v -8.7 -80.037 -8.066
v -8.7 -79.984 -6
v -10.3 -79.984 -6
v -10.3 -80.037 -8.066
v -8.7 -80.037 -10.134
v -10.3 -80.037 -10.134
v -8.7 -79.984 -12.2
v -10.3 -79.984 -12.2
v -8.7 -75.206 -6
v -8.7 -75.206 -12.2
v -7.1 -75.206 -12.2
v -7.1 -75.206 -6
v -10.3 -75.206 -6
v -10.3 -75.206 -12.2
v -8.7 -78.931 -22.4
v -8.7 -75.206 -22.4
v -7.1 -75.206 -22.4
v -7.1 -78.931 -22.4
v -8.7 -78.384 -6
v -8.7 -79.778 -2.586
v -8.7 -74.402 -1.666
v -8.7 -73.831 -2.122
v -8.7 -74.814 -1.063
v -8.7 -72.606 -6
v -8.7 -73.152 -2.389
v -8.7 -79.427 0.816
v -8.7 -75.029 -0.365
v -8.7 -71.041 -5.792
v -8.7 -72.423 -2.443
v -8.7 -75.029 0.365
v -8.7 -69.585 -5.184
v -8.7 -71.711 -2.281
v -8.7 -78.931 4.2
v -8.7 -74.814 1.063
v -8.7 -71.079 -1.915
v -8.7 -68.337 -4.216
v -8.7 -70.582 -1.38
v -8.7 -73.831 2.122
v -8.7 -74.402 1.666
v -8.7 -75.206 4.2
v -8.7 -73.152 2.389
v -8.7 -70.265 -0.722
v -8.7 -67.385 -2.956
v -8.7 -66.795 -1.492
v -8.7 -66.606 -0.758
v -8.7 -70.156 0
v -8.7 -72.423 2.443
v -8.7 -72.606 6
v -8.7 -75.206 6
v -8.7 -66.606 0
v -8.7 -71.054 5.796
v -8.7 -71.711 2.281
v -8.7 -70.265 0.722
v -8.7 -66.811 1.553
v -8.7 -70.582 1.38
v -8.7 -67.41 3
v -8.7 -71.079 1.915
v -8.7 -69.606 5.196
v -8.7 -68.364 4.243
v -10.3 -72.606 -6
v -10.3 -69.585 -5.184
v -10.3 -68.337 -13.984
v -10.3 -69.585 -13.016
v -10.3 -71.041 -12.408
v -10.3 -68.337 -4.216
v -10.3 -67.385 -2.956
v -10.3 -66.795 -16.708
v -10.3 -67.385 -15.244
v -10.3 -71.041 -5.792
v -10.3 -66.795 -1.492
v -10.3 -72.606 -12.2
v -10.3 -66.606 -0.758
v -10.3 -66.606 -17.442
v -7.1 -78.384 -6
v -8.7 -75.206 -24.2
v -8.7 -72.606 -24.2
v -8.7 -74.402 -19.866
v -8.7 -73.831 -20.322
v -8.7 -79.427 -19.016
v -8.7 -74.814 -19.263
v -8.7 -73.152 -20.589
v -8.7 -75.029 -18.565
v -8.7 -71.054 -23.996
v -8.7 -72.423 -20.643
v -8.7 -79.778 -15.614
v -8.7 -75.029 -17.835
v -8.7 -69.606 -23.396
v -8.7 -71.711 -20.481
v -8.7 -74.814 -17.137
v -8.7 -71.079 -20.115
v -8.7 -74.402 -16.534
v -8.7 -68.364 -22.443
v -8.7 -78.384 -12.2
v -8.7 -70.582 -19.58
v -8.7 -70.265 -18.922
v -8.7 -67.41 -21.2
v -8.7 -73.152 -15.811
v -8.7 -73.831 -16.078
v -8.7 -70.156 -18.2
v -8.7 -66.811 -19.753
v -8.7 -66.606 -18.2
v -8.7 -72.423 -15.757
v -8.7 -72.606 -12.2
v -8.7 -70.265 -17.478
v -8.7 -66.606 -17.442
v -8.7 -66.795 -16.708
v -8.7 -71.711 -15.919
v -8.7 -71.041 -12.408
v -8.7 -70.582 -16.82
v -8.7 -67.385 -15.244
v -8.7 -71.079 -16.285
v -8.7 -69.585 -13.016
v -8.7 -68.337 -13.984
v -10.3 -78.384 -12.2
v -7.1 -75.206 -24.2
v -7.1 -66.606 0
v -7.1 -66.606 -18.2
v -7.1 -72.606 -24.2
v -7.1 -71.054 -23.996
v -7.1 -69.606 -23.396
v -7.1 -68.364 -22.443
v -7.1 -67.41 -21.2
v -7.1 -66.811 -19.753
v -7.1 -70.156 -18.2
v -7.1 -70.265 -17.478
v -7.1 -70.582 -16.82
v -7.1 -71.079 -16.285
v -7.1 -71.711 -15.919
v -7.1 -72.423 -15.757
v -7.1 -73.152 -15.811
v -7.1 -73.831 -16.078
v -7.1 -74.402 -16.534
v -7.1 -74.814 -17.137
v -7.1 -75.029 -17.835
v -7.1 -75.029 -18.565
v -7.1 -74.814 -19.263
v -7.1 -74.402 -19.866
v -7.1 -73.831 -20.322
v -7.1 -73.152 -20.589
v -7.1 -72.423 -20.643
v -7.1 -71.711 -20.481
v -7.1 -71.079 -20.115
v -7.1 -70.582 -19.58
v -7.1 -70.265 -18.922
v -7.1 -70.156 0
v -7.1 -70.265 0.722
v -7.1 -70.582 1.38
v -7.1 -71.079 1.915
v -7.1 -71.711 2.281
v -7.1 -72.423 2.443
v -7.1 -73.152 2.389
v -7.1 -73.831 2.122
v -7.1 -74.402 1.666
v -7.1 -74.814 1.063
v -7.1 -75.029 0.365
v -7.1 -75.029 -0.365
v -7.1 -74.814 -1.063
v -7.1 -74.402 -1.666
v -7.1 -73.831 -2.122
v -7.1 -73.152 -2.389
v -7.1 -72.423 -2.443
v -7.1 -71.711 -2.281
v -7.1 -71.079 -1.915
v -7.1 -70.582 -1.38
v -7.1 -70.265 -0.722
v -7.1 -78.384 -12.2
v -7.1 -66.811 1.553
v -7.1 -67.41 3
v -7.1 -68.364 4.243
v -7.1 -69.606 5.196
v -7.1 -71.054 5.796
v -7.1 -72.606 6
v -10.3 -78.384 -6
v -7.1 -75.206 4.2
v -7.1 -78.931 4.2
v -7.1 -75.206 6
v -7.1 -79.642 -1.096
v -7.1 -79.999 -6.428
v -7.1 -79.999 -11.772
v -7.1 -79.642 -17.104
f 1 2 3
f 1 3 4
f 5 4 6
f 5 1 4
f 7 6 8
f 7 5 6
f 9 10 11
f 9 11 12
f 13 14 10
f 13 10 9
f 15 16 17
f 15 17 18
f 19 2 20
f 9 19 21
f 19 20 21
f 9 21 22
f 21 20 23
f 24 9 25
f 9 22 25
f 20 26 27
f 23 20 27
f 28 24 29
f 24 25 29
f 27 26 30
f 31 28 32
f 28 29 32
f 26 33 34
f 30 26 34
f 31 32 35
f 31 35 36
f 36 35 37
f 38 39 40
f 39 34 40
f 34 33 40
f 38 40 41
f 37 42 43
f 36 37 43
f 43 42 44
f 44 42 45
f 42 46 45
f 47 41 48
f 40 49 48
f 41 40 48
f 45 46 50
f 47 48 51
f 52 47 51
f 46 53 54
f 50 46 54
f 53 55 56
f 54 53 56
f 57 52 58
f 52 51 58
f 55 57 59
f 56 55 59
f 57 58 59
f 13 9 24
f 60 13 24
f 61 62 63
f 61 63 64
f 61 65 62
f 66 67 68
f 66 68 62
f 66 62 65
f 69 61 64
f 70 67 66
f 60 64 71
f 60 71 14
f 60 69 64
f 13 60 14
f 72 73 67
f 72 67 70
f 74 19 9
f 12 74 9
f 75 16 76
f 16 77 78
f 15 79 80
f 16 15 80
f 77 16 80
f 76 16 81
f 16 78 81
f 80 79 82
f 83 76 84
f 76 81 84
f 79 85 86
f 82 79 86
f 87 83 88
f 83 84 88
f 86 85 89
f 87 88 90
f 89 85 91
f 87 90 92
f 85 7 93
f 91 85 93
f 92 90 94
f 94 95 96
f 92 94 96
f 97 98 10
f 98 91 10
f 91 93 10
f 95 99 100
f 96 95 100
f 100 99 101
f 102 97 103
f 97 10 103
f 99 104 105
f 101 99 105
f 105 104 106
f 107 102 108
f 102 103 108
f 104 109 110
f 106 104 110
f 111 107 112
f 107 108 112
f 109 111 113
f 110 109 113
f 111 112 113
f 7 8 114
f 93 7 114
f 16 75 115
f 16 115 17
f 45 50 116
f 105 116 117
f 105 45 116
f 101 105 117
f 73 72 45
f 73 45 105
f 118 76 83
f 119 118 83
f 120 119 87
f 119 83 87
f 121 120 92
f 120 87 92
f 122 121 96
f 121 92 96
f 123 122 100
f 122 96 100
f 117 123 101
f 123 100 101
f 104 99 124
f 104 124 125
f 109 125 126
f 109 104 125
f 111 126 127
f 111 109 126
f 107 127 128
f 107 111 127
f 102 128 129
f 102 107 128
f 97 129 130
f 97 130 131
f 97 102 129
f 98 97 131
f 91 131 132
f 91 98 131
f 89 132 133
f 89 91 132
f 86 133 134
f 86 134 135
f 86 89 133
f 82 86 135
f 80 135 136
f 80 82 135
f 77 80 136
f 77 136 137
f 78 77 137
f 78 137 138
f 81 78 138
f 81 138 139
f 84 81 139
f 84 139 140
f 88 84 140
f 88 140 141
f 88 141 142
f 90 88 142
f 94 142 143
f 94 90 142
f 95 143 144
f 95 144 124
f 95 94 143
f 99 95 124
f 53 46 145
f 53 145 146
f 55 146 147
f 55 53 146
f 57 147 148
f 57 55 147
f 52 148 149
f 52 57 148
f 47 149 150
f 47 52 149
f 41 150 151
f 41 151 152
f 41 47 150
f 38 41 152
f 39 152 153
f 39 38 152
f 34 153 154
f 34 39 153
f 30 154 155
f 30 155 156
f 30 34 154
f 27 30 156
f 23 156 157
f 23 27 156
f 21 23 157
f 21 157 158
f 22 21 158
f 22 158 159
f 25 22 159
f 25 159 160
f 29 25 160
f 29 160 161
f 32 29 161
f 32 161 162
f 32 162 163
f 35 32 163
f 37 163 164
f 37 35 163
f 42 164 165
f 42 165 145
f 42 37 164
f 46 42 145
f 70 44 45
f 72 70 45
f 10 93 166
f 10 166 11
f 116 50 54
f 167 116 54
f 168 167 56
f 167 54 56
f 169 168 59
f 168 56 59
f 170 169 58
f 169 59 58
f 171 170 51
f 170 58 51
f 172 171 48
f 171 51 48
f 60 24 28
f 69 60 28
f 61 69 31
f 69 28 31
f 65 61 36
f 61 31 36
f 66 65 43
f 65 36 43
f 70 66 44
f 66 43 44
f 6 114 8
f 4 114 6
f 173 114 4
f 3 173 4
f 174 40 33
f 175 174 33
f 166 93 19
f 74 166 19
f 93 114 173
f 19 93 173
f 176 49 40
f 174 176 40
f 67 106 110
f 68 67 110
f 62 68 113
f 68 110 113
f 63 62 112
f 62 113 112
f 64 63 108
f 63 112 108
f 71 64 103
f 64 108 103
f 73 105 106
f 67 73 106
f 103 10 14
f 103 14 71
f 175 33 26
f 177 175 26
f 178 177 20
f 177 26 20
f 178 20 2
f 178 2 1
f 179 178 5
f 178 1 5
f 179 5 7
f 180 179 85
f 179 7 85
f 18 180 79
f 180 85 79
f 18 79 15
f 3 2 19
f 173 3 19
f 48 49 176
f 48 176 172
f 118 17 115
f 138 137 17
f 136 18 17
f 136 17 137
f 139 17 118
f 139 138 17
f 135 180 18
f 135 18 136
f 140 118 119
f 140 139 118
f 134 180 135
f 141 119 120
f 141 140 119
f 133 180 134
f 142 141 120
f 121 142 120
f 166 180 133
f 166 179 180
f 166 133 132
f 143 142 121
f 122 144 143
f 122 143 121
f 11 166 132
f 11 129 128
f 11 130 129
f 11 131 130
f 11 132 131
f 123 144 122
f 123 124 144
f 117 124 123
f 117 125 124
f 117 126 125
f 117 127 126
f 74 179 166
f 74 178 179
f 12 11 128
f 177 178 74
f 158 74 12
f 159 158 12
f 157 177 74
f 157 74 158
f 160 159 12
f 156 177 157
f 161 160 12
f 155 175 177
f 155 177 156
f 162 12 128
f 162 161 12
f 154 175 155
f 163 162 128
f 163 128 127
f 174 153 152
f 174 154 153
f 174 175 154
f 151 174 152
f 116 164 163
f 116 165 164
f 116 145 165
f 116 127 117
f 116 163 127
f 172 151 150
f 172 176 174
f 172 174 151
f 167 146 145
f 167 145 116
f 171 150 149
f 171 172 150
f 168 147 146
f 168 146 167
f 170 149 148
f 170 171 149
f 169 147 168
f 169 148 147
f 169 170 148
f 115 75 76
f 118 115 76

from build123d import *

# Parameters (mm, degrees)
SKETCH010_R          = 2.45
PAD007_DEPTH         = 1.6
PAD008_DEPTH         = 1.6
SKETCH059_W          = 3.1771358599
SKETCH059_H          = 6.2
POCKET022_DEPTH      = 1.6
POCKET022_DEPTH_BACK = 1.6


with BuildPart() as part:
    # Sketch010 → Pad007 (new body)
    with BuildSketch(Plane.YZ.offset(-8.7)):
        with BuildLine():
            ThreePointArc((-6, 6), (-7.4371881489, -9.1), (-6, -24.2))
            Line((-6, -24.2), (0, -24.2))
            ThreePointArc((0, -24.2), (4.2426406871, -22.4426406871), (6, -18.2))
            Line((6, 0), (6, -18.2))
            ThreePointArc((6, 0), (4.2426406871, 4.2426406871), (0, 6))
            Line((-6, 6), (0, 6))
        make_face()
        Circle(SKETCH010_R, mode=Mode.SUBTRACT)
        with Locations((0, -18.2)):
            Circle(SKETCH010_R, mode=Mode.SUBTRACT)
    extrude(amount=PAD007_DEPTH)

    # Sketch011 → Pad008 (join)
    with BuildSketch(Plane.YZ.offset(-8.7)):
        with BuildLine():
            ThreePointArc((5.8114989668, -16.707860677), (3.6774423219, -13.4590699257), (0, -12.2))
            Line((-7.3771358599, -12.2), (0, -12.2))
            ThreePointArc((-7.3771358599, -6), (-7.4371881489, -9.1), (-7.3771358599, -12.2))
            Line((-7.3771358599, -6), (0, -6))
            ThreePointArc((0, -6), (3.6774423219, -4.7409300743), (5.8114989668, -1.492139323))
            Line((5.8114989668, -1.492139323), (6, -0.7579762707))
            Line((6, -0.7579762707), (6, -17.4420237293))
            Line((6, -17.4420237293), (5.8114989668, -16.707860677))
        make_face()
    extrude(amount=-PAD008_DEPTH)

    # Sketch059 → Pocket022 (cut, two sides)
    with BuildSketch(Plane.YZ.offset(-8.7)) as pocket022_sk:
        with BuildLine():
            Line((-2.6, 6), (-2.6, 4.2))
            Line((-2.6, 4.2), (-6.3244944235, 4.2))
            ThreePointArc((-6, 6), (-6.167388681, 5.1009268767), (-6.3244944235, 4.2))
            Line((-6, 6), (-2.6, 6))
        make_face()
        with BuildLine():
            Line((-6, -24.2), (-2.6, -24.2))
            Line((-2.6, -24.2), (-2.6, -22.4))
            Line((-2.6, -22.4), (-6.3244944235, -22.4))
            ThreePointArc((-6.3244944235, -22.4), (-6.167388681, -23.3009268767), (-6, -24.2))
        make_face()
        with Locations((-4.18856793, -9.1)):
            Rectangle(SKETCH059_W, SKETCH059_H)
    extrude(amount=-POCKET022_DEPTH, mode=Mode.SUBTRACT)
    extrude(pocket022_sk.sketch, amount=POCKET022_DEPTH_BACK, mode=Mode.SUBTRACT)


with BuildPart() as part_1:
    # Body007 placement: moved
    add(part.part.moved(Location((0, -72.6064407756, 0))))


solid = part_1.part
